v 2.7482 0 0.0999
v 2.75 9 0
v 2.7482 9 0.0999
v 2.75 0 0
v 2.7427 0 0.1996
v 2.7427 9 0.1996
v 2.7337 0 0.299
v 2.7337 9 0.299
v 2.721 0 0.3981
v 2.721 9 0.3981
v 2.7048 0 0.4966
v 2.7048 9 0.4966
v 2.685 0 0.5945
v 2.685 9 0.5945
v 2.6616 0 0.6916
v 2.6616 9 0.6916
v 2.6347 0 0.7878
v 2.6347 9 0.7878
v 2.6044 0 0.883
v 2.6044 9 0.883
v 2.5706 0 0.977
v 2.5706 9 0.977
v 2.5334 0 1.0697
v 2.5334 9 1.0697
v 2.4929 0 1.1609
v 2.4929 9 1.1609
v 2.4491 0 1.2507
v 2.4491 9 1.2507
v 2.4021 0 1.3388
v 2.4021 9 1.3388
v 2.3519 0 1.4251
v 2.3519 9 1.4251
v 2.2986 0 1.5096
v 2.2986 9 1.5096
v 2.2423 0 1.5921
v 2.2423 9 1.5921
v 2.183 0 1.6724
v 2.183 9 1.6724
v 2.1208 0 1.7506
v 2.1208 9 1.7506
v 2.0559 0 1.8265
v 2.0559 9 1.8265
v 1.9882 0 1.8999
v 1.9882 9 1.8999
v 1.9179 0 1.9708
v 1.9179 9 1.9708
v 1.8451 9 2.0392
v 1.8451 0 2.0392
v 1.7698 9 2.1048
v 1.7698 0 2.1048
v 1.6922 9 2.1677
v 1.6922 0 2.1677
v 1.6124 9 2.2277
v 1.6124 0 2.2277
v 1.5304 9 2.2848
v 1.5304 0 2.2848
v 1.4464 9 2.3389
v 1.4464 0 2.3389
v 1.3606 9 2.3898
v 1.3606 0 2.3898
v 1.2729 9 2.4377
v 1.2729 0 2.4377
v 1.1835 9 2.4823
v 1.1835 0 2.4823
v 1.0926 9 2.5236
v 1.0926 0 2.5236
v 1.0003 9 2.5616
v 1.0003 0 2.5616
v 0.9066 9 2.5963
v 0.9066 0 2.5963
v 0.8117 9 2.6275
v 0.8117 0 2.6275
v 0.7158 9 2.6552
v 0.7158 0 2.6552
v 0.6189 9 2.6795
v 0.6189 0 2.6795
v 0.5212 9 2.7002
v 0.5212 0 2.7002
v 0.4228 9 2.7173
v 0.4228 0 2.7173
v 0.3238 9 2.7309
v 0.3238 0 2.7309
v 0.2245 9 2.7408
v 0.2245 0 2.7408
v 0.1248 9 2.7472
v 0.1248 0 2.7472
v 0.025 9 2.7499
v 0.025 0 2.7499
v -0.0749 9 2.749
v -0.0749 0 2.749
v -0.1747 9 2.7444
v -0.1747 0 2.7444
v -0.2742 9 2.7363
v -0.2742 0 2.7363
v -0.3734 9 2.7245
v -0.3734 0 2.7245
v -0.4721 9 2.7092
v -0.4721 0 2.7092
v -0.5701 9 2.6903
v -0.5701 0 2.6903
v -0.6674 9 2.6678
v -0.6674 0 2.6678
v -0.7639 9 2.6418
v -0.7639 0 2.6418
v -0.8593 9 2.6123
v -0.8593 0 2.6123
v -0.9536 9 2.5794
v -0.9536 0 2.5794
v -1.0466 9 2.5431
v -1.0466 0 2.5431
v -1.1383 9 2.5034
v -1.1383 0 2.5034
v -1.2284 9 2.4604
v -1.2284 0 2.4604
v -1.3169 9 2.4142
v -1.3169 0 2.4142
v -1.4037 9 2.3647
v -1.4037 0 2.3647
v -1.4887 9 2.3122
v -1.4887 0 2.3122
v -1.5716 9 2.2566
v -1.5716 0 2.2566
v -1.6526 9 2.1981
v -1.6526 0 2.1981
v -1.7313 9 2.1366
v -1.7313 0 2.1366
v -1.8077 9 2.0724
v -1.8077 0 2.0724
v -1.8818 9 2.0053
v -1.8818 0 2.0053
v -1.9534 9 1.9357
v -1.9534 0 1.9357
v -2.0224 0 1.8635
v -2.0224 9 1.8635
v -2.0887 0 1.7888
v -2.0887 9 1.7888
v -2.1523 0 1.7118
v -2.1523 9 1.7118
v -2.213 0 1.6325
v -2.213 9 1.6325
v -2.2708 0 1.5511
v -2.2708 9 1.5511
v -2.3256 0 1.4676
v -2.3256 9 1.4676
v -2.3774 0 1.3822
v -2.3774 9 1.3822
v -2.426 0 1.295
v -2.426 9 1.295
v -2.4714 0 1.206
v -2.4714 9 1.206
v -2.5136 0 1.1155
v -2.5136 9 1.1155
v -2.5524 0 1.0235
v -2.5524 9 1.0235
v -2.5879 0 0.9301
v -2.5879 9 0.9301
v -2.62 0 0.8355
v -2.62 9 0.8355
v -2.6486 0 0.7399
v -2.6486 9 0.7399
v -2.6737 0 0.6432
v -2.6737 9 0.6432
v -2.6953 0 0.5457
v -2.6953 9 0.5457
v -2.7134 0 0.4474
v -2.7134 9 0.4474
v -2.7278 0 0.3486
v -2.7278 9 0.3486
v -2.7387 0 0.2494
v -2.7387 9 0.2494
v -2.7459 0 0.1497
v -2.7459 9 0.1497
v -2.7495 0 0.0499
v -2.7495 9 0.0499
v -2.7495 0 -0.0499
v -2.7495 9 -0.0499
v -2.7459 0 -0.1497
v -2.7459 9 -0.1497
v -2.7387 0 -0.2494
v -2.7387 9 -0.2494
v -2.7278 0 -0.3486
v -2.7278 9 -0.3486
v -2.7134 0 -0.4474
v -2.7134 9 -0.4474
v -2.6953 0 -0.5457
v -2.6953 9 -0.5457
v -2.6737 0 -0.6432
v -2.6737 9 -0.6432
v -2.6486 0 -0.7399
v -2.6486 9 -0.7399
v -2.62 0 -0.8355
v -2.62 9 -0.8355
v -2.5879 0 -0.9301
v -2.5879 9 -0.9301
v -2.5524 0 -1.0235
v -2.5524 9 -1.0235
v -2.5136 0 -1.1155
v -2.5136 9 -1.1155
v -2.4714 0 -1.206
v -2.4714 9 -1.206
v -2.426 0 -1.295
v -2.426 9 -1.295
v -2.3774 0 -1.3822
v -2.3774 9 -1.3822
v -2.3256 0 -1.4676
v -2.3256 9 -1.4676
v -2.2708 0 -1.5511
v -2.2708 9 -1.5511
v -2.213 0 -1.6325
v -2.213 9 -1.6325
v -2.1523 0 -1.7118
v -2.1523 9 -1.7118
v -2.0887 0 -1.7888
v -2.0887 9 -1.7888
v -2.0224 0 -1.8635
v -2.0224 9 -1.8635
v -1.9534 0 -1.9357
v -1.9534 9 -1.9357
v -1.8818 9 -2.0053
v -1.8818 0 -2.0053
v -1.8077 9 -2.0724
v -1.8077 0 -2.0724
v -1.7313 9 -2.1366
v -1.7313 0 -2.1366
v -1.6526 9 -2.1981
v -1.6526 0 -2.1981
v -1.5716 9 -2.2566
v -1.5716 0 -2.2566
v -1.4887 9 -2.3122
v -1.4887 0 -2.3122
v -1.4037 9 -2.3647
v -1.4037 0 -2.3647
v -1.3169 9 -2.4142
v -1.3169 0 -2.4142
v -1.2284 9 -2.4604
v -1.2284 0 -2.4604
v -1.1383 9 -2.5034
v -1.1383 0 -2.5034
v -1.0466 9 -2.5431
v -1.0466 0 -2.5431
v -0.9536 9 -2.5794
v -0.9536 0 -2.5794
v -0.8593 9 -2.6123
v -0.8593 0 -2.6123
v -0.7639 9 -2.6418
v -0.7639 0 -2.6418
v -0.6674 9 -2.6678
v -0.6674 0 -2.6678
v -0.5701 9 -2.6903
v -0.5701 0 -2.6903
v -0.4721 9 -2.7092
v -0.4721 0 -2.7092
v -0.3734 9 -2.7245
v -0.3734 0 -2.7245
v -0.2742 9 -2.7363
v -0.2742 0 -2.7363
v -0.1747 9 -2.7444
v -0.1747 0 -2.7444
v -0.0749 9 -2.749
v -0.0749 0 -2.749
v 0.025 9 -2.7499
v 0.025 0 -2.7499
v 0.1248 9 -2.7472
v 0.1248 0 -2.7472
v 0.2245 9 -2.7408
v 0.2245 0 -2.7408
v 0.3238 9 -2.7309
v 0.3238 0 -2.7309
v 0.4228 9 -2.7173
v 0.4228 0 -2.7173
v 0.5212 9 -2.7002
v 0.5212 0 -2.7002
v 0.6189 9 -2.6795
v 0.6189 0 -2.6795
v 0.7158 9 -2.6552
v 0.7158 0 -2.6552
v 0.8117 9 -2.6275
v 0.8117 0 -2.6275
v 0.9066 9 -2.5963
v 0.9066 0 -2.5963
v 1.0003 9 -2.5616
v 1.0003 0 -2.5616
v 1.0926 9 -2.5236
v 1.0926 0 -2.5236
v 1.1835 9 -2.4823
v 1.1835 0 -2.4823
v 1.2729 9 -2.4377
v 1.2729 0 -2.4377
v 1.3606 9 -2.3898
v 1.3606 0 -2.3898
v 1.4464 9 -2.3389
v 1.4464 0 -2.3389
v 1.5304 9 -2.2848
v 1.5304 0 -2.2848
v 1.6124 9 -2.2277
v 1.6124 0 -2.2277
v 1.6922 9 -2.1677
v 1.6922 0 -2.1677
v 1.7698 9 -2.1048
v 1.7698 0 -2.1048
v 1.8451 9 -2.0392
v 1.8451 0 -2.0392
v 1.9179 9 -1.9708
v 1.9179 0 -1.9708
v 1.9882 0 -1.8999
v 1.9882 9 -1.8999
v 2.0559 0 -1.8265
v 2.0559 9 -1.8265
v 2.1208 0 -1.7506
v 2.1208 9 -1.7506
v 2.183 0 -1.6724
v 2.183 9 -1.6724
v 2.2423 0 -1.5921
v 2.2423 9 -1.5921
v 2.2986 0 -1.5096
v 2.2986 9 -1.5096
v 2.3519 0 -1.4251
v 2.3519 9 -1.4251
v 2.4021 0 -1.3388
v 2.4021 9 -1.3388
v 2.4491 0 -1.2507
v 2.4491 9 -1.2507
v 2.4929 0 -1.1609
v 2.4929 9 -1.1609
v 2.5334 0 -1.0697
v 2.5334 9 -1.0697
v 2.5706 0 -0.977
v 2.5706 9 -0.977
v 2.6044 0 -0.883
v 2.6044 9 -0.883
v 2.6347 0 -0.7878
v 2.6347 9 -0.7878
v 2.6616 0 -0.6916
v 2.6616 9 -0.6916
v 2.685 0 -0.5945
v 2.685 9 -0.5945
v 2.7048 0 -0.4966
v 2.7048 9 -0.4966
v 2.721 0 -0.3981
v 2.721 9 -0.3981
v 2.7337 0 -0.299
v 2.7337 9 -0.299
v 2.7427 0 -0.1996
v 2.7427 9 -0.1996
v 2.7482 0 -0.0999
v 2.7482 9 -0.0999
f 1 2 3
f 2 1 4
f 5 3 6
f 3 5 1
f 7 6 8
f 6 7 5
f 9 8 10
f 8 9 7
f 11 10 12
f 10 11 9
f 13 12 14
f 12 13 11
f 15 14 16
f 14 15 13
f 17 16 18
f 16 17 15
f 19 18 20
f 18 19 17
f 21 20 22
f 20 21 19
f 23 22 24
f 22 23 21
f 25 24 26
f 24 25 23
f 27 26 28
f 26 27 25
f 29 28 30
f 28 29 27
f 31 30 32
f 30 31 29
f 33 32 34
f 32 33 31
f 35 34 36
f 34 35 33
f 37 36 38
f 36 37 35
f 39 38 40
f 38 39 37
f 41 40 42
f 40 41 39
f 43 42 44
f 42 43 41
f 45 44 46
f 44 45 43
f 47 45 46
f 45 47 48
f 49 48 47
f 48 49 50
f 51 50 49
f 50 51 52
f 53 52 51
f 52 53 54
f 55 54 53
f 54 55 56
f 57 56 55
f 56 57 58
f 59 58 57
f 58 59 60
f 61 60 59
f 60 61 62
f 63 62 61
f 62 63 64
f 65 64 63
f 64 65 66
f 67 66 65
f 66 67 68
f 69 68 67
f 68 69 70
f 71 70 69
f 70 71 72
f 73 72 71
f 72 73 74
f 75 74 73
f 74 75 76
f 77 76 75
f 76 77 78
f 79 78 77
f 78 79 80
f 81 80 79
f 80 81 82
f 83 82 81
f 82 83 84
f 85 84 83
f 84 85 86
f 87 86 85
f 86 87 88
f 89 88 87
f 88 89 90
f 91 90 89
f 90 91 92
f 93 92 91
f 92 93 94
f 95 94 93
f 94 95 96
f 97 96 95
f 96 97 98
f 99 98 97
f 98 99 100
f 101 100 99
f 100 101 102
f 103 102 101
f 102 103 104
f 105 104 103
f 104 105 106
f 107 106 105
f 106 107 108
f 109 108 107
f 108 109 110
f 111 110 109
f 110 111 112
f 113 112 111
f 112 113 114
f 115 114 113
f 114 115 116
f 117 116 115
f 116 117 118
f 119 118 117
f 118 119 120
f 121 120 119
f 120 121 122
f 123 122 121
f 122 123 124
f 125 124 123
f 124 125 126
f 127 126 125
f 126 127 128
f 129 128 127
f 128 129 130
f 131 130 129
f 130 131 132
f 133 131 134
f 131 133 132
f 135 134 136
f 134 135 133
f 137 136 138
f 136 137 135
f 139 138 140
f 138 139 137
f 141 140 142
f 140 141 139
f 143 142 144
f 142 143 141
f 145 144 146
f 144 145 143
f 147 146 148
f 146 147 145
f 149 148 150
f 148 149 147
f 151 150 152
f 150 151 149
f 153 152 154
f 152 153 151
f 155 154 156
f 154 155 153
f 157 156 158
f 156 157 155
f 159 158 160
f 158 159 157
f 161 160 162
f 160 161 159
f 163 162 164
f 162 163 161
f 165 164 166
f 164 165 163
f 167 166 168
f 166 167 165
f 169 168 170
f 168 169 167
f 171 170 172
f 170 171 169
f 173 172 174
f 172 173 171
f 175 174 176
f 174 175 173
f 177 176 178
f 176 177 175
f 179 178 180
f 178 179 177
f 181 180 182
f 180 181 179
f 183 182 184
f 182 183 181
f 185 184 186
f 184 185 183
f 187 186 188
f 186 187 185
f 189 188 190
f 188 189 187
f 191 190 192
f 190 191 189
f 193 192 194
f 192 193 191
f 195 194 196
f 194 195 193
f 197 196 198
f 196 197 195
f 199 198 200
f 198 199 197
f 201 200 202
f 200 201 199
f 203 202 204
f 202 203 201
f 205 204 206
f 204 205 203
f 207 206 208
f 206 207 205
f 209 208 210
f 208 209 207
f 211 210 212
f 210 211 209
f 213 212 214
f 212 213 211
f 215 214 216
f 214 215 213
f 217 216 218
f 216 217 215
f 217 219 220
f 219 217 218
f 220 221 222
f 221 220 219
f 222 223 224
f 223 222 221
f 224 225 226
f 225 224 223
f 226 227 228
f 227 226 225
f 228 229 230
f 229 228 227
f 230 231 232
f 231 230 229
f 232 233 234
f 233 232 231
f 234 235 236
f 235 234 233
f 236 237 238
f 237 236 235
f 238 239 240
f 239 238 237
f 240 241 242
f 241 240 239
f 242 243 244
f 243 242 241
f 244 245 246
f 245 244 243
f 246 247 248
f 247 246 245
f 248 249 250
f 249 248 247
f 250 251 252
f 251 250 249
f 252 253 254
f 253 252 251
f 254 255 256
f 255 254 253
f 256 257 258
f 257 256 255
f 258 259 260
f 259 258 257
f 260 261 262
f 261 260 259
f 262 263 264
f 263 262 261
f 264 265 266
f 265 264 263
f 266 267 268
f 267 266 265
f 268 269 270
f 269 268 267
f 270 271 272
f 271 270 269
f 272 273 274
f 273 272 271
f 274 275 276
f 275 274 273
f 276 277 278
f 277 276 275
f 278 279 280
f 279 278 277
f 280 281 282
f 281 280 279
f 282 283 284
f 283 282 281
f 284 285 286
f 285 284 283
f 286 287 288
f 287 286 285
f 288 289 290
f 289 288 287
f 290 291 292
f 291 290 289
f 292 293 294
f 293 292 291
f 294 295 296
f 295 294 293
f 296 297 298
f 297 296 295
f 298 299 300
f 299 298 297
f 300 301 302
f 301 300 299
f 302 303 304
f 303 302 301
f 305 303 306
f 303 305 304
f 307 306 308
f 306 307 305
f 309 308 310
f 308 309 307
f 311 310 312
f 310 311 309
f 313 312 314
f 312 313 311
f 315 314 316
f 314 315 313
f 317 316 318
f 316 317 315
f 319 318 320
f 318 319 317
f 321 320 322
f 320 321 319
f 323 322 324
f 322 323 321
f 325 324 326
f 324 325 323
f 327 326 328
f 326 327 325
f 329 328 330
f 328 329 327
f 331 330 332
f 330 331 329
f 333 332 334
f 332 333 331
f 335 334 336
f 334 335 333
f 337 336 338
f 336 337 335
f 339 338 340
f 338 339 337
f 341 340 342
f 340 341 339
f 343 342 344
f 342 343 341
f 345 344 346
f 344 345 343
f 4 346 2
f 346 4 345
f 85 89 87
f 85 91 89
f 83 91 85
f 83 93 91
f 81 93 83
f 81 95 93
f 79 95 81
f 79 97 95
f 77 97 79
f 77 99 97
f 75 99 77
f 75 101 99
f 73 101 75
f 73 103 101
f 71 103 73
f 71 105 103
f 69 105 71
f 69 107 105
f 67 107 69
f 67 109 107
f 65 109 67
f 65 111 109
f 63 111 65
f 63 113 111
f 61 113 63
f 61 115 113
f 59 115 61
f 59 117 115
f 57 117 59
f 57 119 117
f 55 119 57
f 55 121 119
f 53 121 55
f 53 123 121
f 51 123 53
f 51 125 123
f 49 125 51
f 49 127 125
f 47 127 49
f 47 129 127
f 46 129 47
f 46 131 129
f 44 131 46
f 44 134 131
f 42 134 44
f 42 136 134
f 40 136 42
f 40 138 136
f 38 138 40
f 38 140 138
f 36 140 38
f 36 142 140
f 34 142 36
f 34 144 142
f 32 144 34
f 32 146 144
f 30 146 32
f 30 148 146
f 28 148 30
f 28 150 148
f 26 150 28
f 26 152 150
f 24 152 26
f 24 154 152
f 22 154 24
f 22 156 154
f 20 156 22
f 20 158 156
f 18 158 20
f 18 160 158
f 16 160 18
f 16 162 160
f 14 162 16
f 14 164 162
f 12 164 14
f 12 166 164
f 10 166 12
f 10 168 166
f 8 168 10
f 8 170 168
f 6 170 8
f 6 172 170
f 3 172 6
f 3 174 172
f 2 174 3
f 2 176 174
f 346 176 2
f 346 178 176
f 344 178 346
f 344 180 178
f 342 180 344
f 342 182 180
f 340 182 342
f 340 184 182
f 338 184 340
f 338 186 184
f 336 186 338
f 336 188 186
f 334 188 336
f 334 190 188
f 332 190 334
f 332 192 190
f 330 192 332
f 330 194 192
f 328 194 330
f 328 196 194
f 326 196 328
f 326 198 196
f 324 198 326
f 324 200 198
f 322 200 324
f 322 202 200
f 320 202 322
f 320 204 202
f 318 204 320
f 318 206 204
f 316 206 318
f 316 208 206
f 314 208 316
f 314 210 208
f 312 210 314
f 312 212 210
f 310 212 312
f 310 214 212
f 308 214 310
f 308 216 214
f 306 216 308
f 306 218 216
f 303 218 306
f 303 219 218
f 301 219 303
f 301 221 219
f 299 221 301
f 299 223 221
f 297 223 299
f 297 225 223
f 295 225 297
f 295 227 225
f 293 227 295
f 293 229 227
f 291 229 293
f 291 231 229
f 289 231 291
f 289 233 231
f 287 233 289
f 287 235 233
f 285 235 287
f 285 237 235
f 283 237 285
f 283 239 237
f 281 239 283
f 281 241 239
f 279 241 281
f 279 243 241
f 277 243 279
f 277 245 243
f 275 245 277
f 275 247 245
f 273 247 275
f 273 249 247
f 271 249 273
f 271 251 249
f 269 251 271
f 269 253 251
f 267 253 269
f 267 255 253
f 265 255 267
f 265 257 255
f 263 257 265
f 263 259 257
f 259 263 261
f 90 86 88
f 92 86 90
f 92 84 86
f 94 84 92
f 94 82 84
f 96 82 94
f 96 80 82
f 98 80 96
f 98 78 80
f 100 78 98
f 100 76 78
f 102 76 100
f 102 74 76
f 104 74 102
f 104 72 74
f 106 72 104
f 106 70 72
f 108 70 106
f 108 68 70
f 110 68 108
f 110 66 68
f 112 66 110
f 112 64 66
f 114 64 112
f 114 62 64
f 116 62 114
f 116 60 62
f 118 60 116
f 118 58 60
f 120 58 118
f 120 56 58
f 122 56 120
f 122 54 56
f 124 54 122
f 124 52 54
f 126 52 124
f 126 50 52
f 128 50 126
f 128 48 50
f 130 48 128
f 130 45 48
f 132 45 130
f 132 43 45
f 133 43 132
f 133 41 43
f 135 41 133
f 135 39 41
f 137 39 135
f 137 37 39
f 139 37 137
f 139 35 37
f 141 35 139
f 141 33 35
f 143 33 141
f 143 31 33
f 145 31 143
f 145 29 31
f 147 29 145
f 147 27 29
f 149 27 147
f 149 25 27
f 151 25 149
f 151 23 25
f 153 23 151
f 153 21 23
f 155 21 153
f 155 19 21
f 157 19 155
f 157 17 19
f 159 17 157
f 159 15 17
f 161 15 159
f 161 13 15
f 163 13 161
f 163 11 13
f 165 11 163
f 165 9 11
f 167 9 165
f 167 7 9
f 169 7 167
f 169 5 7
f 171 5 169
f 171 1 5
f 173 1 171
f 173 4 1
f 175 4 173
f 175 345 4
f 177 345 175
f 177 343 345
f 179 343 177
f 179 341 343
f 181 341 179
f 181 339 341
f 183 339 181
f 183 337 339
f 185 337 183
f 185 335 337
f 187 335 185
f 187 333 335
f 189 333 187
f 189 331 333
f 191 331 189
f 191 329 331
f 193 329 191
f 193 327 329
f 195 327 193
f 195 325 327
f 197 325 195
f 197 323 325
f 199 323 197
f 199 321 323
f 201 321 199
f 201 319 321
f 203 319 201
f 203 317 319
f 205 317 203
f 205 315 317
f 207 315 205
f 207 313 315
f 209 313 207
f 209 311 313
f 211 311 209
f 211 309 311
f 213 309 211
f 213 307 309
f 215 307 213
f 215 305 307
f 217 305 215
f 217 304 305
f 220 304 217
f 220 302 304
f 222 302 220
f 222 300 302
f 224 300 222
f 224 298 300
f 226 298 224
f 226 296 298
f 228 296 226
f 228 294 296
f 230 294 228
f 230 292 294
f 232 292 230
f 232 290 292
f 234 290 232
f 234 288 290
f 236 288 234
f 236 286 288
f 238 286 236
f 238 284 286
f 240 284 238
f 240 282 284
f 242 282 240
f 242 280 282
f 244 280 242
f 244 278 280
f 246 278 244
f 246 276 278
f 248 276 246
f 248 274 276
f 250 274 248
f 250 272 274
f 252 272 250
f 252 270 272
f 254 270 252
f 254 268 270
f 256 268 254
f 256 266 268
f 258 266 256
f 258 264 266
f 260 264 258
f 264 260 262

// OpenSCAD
$fa = 1;
$fs = 0.1;

rotate([90, 0, 0])
translate([0, 0, -9.0])
    cylinder(h=9.0, r=5.5/2.0);
